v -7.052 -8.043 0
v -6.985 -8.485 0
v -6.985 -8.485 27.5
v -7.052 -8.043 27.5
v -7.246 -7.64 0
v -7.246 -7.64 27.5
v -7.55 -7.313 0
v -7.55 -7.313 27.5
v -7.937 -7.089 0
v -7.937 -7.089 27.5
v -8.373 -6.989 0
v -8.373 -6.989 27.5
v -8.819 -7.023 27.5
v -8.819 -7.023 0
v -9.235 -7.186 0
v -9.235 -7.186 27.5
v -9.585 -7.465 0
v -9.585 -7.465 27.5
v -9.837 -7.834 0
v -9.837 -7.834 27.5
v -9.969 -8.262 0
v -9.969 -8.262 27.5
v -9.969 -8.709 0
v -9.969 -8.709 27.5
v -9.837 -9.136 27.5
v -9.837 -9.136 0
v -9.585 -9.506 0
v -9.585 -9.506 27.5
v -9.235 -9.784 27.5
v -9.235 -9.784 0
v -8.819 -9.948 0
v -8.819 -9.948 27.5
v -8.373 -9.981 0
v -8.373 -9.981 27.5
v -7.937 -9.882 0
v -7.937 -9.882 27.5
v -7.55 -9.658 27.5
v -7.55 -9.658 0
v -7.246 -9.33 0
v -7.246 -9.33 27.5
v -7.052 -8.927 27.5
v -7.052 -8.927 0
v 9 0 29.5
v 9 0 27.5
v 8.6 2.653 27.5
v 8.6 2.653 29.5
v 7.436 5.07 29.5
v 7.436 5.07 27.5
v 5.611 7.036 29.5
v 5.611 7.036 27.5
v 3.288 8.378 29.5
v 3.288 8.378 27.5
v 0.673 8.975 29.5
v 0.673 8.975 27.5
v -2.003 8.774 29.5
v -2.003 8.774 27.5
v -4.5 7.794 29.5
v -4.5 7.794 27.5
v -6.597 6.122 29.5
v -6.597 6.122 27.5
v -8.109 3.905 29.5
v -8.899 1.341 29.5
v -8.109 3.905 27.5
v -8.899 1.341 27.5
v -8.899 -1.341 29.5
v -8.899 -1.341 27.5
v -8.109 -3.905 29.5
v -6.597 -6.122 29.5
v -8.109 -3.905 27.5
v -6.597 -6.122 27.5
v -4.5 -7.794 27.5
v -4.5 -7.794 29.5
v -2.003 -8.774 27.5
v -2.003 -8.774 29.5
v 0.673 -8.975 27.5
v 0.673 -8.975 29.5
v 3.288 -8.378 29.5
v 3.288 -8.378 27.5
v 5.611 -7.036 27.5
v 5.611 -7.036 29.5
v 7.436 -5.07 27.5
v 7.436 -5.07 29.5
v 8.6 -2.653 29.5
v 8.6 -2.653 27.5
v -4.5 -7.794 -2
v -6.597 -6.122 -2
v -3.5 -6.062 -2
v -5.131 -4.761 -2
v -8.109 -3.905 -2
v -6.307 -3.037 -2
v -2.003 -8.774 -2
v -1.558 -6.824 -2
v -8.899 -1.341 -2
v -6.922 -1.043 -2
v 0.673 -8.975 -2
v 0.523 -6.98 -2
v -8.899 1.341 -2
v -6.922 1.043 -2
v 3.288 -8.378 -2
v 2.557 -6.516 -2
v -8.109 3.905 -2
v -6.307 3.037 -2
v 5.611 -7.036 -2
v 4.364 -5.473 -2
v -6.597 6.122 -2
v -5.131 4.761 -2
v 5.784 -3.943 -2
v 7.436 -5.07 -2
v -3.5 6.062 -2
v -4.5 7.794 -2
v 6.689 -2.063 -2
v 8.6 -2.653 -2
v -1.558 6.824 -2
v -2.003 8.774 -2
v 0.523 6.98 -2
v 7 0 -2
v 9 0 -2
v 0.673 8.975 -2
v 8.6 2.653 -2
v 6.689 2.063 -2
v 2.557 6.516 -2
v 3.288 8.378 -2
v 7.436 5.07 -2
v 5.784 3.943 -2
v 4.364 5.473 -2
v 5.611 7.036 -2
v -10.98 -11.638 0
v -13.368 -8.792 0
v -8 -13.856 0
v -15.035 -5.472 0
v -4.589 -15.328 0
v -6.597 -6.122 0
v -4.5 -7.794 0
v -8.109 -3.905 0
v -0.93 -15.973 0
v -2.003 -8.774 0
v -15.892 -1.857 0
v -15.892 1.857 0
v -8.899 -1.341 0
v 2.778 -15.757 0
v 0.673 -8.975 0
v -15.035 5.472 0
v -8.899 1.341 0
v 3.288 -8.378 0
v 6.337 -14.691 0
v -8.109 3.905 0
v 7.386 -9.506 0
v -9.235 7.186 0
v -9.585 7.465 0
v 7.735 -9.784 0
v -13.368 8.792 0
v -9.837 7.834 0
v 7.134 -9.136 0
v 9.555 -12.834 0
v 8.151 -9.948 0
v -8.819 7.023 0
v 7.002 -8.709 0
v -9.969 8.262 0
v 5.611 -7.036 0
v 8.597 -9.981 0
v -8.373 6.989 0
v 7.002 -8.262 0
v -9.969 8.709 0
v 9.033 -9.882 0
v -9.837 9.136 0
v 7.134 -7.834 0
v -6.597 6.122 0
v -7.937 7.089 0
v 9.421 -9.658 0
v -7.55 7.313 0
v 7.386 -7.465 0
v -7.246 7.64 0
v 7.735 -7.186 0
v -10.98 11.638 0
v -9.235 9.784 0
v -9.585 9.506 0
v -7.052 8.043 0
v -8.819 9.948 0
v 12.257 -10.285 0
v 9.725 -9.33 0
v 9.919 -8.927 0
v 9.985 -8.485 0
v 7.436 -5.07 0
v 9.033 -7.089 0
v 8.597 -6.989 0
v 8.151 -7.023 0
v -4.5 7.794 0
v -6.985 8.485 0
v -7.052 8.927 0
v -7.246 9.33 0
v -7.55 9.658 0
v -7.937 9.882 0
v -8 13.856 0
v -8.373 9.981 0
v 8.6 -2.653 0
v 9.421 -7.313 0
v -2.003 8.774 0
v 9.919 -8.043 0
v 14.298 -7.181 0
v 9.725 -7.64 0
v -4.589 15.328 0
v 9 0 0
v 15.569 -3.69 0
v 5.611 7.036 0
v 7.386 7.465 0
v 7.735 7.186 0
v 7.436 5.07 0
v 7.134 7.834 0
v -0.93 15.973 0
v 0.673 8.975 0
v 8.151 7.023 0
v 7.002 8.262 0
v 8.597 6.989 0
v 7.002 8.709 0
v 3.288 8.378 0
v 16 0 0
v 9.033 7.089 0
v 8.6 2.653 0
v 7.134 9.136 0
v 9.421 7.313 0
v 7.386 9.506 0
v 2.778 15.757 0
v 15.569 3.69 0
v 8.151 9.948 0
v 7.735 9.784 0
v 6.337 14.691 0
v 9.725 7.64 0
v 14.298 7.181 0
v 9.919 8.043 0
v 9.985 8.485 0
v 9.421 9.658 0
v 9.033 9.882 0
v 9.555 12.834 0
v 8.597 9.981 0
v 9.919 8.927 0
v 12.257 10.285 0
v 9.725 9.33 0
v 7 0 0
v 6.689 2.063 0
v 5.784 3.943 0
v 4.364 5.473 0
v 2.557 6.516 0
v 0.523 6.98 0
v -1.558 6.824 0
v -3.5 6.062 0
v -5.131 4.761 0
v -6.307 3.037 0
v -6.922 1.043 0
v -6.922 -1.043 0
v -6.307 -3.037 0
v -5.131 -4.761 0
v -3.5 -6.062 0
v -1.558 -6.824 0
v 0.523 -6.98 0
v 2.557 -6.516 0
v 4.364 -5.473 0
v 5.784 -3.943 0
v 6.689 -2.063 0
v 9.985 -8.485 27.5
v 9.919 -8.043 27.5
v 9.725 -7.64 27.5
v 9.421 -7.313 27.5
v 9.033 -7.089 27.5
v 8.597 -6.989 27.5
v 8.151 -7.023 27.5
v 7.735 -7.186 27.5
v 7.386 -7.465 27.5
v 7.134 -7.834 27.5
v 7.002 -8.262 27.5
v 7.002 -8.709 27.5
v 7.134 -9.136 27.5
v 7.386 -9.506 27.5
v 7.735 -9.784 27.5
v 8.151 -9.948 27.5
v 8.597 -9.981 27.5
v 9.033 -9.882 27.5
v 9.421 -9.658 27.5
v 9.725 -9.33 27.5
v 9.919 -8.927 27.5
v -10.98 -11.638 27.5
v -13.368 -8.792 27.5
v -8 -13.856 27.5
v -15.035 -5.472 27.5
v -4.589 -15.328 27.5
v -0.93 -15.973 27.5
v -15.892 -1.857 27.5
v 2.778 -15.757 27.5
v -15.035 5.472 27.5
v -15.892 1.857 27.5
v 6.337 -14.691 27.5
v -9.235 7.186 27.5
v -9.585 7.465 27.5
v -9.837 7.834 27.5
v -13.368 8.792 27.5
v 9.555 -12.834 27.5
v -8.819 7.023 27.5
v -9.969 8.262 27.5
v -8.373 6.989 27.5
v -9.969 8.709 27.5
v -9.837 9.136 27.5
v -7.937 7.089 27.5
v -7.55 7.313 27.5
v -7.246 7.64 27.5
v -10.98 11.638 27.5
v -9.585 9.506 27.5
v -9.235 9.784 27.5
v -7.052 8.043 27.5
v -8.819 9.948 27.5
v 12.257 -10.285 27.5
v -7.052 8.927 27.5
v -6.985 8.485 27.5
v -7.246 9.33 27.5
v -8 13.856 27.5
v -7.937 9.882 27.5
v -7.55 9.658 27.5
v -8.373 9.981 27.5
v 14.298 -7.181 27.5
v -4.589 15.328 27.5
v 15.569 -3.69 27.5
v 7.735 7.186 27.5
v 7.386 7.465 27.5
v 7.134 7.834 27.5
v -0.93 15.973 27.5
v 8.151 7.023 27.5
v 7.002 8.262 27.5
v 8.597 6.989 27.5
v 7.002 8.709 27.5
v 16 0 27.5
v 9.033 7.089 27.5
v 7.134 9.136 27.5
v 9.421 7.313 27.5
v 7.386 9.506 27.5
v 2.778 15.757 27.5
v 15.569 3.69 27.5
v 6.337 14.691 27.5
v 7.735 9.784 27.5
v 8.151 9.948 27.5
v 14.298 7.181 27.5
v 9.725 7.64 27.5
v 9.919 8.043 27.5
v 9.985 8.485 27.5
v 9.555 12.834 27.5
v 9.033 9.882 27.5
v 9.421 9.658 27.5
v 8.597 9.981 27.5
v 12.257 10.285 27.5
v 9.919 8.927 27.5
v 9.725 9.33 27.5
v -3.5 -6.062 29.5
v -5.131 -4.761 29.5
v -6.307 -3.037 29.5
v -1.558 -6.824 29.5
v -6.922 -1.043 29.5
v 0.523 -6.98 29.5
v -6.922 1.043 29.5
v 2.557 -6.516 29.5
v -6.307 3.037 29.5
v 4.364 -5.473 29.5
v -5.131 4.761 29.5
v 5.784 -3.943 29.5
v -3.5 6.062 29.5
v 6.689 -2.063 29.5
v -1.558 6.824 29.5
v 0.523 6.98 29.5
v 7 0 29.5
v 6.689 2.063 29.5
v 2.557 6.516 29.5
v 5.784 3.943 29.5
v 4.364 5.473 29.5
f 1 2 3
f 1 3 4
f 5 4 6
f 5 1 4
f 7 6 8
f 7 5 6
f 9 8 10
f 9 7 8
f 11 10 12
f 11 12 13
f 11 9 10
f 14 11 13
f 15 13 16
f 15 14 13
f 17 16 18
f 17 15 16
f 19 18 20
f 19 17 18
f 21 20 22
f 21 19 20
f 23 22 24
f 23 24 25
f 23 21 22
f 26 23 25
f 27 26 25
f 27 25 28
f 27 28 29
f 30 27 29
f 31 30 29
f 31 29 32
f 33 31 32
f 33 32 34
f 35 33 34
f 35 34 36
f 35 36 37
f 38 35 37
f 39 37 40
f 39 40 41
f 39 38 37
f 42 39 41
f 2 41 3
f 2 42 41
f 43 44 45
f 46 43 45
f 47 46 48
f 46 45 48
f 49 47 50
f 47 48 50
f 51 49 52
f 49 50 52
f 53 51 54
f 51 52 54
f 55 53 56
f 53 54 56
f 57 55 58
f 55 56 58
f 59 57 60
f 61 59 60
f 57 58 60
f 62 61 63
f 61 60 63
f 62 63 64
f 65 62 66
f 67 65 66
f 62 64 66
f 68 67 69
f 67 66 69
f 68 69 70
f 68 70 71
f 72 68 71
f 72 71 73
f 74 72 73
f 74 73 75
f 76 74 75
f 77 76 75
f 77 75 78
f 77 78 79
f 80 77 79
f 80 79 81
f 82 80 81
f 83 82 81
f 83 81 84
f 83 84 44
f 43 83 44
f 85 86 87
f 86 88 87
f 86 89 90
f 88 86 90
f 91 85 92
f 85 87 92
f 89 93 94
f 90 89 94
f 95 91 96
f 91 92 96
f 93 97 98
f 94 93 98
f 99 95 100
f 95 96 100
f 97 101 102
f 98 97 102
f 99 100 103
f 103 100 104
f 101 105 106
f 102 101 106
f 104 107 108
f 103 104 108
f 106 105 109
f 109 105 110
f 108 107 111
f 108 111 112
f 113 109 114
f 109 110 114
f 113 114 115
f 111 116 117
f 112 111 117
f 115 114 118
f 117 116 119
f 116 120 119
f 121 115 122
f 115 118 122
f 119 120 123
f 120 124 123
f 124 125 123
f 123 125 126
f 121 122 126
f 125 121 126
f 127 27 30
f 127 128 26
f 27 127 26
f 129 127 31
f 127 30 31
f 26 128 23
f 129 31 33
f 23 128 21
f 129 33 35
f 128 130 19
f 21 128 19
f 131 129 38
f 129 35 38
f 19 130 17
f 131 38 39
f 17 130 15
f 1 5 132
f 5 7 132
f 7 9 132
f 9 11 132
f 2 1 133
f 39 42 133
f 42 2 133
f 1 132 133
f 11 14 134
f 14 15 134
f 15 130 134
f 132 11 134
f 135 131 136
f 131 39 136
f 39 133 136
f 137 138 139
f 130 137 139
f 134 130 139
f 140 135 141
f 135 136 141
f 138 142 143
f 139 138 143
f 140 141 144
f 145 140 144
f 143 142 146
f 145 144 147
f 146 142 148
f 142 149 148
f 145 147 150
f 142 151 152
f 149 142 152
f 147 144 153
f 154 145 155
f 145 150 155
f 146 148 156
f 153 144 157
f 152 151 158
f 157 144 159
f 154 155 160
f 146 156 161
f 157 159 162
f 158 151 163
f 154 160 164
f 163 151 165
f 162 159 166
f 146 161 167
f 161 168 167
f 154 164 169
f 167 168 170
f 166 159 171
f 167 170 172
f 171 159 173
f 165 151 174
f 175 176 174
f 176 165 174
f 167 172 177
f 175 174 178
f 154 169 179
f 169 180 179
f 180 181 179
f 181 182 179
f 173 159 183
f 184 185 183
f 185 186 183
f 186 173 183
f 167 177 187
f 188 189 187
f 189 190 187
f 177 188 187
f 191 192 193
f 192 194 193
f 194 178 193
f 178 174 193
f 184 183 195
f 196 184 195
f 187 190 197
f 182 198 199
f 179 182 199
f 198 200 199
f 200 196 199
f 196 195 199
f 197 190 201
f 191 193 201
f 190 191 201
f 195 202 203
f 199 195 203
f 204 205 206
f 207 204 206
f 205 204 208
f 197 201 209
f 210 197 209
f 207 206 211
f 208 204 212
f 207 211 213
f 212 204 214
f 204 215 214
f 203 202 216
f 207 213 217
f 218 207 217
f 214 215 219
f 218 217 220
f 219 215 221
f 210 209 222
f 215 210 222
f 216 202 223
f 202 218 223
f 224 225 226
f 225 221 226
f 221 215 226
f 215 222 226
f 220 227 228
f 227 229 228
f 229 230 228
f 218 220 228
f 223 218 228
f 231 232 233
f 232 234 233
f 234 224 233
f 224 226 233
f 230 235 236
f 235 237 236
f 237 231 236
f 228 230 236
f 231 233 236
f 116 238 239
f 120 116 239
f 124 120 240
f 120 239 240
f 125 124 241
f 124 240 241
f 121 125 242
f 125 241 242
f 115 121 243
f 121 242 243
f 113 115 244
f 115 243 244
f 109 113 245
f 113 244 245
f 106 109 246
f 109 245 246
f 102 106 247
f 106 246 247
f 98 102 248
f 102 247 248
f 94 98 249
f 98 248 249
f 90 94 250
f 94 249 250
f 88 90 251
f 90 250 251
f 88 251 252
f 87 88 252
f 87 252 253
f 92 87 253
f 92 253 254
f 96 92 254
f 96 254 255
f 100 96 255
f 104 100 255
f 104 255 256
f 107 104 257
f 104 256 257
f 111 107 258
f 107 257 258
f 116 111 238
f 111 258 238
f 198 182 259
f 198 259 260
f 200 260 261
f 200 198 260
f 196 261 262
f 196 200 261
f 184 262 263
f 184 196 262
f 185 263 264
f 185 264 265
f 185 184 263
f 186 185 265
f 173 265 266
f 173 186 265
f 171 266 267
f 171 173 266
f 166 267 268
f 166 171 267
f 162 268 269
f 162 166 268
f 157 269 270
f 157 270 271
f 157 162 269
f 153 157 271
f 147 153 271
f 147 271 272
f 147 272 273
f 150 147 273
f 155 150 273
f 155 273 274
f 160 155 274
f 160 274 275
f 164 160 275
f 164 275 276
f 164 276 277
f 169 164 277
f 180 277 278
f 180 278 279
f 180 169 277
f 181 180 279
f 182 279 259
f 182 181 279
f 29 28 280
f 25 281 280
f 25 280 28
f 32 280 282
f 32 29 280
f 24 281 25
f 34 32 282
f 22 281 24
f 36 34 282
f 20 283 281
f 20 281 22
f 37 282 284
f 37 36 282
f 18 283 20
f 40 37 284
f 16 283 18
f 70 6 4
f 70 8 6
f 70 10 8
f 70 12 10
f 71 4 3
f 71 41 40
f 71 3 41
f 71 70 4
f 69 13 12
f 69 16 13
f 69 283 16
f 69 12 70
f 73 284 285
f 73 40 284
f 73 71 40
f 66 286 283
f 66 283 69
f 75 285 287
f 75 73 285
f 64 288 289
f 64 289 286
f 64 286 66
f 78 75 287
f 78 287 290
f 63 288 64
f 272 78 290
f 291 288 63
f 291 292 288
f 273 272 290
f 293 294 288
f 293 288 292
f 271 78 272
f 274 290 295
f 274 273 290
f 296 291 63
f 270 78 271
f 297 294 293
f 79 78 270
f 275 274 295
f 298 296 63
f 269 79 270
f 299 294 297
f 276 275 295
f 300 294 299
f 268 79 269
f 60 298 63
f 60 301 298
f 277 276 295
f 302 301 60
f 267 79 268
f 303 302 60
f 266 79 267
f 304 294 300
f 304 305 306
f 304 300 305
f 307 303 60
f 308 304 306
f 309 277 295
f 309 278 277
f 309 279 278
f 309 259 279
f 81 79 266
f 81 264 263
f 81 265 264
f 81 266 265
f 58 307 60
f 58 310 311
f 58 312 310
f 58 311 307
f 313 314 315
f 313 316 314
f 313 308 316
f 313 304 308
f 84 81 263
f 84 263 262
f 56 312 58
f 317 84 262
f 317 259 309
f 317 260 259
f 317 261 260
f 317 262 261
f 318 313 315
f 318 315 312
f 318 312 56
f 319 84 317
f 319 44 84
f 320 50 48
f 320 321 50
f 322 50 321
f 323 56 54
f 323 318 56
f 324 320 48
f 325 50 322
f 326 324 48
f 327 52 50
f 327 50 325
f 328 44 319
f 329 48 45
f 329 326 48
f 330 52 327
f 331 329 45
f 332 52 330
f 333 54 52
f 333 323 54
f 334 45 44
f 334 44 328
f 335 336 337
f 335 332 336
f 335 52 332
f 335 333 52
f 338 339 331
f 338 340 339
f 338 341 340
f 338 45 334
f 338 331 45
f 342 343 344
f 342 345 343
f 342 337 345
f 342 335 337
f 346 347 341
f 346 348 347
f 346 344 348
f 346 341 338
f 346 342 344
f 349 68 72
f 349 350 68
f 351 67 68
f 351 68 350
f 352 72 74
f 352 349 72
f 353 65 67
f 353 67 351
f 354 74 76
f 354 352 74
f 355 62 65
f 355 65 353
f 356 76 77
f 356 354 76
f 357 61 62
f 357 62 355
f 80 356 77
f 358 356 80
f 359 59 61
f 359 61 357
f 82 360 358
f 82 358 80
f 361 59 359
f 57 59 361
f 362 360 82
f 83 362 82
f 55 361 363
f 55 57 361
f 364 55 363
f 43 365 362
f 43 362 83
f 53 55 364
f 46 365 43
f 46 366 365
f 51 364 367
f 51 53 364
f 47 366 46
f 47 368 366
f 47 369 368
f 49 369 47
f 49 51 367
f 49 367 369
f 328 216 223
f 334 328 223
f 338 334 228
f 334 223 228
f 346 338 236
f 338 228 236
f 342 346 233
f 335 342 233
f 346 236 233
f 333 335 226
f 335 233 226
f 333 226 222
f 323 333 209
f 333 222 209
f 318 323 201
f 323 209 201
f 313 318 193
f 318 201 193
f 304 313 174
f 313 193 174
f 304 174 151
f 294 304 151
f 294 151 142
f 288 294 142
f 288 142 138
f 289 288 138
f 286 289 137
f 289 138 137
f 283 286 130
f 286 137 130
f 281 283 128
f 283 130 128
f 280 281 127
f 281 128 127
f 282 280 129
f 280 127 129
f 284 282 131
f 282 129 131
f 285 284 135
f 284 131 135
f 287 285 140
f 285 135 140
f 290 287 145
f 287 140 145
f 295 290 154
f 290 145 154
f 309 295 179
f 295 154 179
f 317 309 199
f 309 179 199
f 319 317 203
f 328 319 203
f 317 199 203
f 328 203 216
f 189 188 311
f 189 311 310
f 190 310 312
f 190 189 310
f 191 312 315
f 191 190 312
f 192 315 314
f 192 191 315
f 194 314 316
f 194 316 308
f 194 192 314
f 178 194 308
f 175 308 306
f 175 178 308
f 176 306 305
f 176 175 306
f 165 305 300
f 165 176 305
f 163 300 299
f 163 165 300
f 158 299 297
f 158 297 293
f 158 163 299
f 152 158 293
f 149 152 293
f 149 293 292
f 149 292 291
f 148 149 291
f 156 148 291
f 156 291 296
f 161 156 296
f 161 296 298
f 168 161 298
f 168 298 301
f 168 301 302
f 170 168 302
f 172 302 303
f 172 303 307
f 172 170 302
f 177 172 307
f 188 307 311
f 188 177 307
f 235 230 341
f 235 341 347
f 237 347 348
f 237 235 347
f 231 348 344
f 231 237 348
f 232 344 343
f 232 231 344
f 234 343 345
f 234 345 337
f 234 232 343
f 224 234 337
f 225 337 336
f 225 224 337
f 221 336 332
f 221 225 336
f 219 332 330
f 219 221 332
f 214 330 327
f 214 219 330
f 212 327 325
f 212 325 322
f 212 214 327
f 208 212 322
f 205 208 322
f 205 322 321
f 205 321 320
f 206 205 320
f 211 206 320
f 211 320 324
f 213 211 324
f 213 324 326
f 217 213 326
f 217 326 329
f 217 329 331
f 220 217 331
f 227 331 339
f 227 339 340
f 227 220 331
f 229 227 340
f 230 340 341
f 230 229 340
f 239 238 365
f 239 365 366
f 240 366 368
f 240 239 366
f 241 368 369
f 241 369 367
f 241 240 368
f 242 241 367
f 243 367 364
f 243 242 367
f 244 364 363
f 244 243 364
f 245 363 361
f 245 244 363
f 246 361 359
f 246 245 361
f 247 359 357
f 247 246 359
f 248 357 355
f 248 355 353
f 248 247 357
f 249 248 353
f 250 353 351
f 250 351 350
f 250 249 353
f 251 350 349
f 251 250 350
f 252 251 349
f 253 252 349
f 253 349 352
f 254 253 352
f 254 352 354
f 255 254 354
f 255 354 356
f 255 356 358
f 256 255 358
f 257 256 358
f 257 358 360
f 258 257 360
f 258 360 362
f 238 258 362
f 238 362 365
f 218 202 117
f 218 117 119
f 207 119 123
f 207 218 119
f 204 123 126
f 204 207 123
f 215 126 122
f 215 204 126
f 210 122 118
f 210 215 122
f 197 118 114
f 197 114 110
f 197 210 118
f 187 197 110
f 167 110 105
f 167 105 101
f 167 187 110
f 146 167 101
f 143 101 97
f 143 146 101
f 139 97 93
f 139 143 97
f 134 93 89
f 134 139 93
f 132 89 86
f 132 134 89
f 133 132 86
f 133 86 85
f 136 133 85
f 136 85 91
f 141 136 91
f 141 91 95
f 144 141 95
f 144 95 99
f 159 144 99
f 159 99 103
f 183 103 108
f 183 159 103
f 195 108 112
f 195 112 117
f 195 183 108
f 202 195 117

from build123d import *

# Parameters (mm, degrees)
SKETCH1_R           = 16
SKETCH1_R_2         = 7
SKETCH1_R_3         = 1.5
BOSS_EXTRUDE1_DEPTH = 27.5
SKETCH1_3_R         = 9
SKETCH1_3_R_2       = 7
BOSS_EXTRUDE2_DEPTH = 29.5
BOSS_EXTRUDE3_START = -2
SKETCH1_4_R         = 9
SKETCH1_4_R_2       = 7
BOSS_EXTRUDE3_DEPTH = 2


with BuildPart() as part:
    # Sketch1 → Boss-Extrude1 (new body)
    with BuildSketch(Plane.XY):
        Circle(SKETCH1_R)
        Circle(SKETCH1_R_2, mode=Mode.SUBTRACT)
        with Locations((-8.485281374, -8.485281374)):
            Circle(SKETCH1_R_3, mode=Mode.SUBTRACT)
        with Locations((8.485281374, -8.485281374)):
            Circle(SKETCH1_R_3, mode=Mode.SUBTRACT)
        with Locations((-8.485281374, 8.485281374)):
            Circle(SKETCH1_R_3, mode=Mode.SUBTRACT)
        with Locations((8.485281374, 8.485281374)):
            Circle(SKETCH1_R_3, mode=Mode.SUBTRACT)
    extrude(amount=BOSS_EXTRUDE1_DEPTH)

    # Sketch1<3> → Boss-Extrude2 (add)
    with BuildSketch(Plane.XY):
        Circle(SKETCH1_3_R)
        Circle(SKETCH1_3_R_2, mode=Mode.SUBTRACT)
    extrude(amount=BOSS_EXTRUDE2_DEPTH)

    # Sketch1<4> → Boss-Extrude3 (add)
    with BuildSketch(Plane.XY.offset(BOSS_EXTRUDE3_START)):
        Circle(SKETCH1_4_R)
        Circle(SKETCH1_4_R_2, mode=Mode.SUBTRACT)
    extrude(amount=BOSS_EXTRUDE3_DEPTH)


solid = part.part
